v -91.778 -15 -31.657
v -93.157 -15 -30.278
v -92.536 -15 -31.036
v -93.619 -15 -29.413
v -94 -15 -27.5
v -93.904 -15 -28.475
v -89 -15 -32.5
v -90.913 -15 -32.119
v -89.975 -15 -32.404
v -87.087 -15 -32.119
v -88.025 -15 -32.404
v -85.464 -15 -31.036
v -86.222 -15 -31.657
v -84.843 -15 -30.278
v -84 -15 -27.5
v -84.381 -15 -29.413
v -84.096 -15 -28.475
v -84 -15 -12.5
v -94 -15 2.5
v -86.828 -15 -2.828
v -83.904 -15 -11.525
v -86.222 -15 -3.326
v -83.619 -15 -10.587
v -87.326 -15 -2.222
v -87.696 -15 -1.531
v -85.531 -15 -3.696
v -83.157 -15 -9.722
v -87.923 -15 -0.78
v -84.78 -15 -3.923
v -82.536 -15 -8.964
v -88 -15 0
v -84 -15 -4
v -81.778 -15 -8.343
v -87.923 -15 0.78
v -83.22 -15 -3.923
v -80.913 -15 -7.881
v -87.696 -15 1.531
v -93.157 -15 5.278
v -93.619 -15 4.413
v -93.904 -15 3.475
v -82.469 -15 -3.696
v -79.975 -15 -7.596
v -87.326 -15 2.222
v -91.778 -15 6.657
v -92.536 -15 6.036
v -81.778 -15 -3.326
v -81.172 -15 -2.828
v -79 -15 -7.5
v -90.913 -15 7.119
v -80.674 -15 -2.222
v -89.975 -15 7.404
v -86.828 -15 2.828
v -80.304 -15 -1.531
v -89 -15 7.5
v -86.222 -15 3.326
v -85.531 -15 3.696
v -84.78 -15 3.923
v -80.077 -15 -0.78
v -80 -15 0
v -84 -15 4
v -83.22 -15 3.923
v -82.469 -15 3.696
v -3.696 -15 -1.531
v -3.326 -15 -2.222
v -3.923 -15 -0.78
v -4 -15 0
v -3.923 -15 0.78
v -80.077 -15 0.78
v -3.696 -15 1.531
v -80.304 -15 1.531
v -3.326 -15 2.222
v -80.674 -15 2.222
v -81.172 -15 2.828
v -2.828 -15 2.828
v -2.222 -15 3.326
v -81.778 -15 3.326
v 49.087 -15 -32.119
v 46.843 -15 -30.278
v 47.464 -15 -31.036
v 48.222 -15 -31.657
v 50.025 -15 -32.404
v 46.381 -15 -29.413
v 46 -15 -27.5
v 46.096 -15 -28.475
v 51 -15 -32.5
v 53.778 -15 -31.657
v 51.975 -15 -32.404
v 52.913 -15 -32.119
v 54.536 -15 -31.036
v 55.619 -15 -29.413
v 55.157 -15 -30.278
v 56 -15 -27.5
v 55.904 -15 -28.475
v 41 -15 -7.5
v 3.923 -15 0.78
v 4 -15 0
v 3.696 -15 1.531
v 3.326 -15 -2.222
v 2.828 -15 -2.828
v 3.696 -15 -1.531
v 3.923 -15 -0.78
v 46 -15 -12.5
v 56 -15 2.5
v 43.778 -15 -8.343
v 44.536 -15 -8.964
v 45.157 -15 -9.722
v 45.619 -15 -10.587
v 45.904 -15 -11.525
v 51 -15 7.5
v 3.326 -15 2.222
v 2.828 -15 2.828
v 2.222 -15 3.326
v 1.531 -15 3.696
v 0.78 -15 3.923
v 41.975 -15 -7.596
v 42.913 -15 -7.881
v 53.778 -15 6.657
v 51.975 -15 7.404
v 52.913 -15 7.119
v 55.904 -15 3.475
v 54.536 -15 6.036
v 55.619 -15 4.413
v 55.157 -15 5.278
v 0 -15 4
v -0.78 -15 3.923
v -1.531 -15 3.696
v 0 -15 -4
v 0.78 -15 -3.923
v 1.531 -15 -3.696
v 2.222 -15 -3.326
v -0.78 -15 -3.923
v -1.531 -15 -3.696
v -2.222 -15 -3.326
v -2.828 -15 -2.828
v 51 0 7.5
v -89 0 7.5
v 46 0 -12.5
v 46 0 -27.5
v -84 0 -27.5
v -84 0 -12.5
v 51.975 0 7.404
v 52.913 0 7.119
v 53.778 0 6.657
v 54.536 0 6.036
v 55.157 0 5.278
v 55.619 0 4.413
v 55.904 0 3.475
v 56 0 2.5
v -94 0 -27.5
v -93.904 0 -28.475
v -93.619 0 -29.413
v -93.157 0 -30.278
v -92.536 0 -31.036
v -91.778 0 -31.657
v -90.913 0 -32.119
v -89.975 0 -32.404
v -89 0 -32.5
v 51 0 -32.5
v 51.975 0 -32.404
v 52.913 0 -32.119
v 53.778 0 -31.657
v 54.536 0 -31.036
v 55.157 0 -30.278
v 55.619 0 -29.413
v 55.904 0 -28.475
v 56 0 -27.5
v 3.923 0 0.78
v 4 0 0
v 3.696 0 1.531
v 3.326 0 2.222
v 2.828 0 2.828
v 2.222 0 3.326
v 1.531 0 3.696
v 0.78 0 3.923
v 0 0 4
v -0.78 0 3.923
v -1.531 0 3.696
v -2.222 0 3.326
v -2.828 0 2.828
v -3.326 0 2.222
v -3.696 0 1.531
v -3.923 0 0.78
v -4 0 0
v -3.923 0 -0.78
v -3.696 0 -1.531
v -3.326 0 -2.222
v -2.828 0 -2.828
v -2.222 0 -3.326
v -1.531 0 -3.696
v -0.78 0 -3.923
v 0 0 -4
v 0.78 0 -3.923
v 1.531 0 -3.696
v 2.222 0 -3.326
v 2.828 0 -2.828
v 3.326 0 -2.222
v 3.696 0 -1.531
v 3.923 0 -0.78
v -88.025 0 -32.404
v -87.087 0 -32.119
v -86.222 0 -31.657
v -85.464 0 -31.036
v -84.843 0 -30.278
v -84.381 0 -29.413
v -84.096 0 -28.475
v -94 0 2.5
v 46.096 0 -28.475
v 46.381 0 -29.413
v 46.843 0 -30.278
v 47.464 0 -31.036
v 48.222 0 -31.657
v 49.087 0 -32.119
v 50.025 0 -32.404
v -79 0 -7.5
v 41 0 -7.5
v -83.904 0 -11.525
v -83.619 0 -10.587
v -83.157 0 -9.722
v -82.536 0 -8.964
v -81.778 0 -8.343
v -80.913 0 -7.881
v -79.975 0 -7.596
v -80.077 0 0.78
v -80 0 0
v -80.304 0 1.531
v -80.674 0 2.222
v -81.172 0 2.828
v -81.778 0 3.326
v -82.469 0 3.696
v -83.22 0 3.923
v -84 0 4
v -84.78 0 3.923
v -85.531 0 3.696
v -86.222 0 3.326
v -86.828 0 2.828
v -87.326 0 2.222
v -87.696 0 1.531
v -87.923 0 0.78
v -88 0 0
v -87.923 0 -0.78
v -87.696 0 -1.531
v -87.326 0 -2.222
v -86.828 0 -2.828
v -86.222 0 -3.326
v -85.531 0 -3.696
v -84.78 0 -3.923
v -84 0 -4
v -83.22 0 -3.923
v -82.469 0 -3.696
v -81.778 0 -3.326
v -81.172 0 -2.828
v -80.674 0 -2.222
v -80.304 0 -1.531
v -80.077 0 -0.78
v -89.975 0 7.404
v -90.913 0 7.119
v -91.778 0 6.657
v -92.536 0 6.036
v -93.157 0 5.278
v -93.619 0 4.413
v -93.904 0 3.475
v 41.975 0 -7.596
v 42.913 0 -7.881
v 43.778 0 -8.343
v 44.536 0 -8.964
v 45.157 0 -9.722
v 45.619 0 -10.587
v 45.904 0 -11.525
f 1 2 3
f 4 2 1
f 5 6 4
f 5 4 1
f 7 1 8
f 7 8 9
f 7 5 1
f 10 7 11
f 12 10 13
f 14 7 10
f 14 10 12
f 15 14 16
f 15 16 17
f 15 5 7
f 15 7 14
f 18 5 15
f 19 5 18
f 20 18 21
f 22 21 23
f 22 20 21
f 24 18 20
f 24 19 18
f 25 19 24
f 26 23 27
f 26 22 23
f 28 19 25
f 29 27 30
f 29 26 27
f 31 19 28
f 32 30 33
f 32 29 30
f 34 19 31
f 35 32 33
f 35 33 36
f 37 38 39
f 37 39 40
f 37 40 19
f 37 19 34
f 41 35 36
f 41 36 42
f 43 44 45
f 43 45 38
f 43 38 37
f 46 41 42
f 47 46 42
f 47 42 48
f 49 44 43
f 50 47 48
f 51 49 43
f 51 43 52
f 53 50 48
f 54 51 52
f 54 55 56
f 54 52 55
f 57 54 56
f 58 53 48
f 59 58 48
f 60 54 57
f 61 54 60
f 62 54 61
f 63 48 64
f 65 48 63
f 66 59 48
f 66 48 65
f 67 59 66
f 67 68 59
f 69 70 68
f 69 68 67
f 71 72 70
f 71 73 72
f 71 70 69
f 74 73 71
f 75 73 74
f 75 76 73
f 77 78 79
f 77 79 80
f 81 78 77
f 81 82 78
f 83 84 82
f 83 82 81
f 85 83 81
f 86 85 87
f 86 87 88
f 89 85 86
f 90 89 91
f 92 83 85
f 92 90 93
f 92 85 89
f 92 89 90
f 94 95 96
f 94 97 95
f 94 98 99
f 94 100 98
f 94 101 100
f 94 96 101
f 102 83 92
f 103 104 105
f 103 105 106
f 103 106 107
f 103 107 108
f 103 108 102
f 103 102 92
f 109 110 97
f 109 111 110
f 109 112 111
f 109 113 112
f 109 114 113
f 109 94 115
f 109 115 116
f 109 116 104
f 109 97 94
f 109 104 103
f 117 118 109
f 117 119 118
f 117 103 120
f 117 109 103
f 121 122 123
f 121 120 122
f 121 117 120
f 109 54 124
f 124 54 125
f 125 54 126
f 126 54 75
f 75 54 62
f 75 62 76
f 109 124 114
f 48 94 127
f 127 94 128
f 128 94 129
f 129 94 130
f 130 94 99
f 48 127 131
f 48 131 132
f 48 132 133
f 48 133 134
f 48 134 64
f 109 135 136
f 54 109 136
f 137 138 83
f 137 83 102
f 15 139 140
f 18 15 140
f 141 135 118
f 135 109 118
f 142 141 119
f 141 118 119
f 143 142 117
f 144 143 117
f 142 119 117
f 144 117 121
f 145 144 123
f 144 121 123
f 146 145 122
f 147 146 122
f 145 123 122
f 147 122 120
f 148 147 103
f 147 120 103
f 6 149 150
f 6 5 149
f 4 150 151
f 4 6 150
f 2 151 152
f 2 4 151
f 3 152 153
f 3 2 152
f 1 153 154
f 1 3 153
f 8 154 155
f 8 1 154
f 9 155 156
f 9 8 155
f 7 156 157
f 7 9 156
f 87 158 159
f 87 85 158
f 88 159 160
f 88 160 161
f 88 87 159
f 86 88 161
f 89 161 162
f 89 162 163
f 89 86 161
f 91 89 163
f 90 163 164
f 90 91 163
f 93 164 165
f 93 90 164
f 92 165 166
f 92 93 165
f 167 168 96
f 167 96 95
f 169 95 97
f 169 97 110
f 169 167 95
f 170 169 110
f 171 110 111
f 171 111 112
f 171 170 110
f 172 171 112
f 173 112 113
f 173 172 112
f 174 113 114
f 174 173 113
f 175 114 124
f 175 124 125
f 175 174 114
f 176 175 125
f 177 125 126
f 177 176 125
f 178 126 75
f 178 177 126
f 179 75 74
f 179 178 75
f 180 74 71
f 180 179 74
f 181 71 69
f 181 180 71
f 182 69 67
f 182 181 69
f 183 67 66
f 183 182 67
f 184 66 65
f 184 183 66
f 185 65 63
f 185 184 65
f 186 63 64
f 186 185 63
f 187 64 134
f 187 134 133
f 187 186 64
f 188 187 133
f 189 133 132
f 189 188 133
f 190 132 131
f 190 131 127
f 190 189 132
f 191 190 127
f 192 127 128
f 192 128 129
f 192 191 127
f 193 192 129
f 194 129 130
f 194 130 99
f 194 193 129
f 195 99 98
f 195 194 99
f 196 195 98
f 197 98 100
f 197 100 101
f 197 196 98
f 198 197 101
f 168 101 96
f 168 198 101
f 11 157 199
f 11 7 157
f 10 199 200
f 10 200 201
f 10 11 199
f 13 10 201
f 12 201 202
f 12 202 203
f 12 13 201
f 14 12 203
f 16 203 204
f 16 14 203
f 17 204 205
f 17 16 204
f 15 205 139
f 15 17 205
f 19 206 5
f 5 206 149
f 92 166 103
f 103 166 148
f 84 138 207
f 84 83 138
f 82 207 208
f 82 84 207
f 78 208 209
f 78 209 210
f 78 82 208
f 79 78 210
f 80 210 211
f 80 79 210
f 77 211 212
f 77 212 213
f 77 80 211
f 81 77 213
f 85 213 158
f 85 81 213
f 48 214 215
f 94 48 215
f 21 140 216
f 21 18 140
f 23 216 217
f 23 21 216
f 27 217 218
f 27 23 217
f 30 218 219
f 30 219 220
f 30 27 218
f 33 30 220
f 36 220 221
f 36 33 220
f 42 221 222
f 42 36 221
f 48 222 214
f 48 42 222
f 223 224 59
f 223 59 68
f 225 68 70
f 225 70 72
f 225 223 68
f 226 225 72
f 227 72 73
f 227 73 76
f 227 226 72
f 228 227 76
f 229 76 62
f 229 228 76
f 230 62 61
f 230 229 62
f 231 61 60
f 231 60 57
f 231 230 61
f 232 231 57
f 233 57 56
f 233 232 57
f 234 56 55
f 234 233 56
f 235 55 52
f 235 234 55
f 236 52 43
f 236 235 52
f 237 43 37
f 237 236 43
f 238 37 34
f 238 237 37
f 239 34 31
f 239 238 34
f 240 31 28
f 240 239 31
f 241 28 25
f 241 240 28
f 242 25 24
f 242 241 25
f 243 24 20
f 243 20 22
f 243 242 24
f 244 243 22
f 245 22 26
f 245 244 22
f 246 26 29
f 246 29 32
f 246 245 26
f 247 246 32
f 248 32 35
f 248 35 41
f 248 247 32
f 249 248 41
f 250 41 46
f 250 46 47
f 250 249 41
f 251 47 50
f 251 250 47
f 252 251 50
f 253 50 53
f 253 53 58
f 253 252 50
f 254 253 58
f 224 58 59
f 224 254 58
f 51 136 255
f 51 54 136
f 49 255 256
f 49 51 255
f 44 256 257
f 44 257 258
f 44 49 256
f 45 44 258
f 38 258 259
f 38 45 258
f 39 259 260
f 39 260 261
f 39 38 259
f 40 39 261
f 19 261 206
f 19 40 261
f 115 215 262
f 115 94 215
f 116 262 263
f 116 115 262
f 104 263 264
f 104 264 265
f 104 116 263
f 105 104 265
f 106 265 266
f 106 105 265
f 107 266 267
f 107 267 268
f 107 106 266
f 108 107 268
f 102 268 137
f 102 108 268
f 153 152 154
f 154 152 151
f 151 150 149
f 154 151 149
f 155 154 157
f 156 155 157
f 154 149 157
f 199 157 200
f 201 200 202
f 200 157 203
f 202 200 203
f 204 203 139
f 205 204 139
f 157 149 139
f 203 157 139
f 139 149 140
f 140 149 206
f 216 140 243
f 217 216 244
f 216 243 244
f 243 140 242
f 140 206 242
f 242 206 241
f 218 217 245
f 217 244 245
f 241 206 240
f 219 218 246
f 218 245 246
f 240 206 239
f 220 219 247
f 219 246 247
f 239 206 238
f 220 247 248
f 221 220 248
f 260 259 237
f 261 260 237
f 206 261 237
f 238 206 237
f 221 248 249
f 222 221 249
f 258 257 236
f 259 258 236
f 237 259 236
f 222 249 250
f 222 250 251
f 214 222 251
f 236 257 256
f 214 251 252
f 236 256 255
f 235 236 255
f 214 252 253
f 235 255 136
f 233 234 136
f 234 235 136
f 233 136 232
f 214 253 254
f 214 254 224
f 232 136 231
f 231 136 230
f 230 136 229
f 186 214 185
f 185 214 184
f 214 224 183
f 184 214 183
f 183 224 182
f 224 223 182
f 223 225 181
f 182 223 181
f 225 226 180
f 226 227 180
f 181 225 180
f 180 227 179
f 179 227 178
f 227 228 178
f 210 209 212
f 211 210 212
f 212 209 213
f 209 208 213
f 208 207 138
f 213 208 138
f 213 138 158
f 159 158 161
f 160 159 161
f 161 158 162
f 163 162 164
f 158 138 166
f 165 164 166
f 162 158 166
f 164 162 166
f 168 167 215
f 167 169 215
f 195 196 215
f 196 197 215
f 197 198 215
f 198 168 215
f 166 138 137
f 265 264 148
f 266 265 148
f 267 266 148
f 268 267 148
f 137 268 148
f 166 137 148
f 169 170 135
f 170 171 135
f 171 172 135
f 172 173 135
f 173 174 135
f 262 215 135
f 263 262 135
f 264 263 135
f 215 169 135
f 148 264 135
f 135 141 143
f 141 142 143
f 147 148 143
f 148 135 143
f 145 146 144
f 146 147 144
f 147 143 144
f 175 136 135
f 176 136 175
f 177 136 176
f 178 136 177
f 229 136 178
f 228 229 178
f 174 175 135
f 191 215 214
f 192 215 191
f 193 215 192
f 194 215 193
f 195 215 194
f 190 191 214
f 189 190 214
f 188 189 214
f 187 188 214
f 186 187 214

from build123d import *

# Parameters (mm, degrees)
F0_R     = 4
F0_W     = 10
F0_H     = 25
F1_DEPTH = 15
F2_R     = 4.99999


# Not quite as in the source:
# - a fillet or chamfer is up to 0.001 mm smaller than in the source, because OpenCascade refuses the exact size


with BuildPart() as f1:
    # F0 (on Front) → F1 (new body)
    with BuildSketch(Plane.XZ):
        Polygon((56, 7.5), (-94, 7.5), (-94, -7.5), (-84, -7.5), (46, -7.5), (56, -7.5), align=None)
        with Locations((-84, 0)):
            Circle(F0_R, mode=Mode.SUBTRACT)
        Circle(F0_R, mode=Mode.SUBTRACT)
        with Locations((-89, -20)):
            Rectangle(F0_W, F0_H)
        with Locations((51, -20)):
            Rectangle(F0_W, F0_H)
    extrude(amount=F1_DEPTH)

    # F2 (radius 5 in the source; OpenCascade refuses exactly that, so slightly less here)
    f2_edges = [f1.edges().sort_by_distance(p)[0] for p in [
        (-84, -7.5, -7.5),
        (46, -7.5, -7.5),
        (56, -7.5, 7.5),
        (56, -7.5, -32.5),
        (46, -7.5, -32.5),
        (-94, -7.5, -32.5),
        (-84, -7.5, -32.5),
        (-94, -7.5, 7.5),
    ]]
    fillet(f2_edges, radius=F2_R)


solid = f1.part
